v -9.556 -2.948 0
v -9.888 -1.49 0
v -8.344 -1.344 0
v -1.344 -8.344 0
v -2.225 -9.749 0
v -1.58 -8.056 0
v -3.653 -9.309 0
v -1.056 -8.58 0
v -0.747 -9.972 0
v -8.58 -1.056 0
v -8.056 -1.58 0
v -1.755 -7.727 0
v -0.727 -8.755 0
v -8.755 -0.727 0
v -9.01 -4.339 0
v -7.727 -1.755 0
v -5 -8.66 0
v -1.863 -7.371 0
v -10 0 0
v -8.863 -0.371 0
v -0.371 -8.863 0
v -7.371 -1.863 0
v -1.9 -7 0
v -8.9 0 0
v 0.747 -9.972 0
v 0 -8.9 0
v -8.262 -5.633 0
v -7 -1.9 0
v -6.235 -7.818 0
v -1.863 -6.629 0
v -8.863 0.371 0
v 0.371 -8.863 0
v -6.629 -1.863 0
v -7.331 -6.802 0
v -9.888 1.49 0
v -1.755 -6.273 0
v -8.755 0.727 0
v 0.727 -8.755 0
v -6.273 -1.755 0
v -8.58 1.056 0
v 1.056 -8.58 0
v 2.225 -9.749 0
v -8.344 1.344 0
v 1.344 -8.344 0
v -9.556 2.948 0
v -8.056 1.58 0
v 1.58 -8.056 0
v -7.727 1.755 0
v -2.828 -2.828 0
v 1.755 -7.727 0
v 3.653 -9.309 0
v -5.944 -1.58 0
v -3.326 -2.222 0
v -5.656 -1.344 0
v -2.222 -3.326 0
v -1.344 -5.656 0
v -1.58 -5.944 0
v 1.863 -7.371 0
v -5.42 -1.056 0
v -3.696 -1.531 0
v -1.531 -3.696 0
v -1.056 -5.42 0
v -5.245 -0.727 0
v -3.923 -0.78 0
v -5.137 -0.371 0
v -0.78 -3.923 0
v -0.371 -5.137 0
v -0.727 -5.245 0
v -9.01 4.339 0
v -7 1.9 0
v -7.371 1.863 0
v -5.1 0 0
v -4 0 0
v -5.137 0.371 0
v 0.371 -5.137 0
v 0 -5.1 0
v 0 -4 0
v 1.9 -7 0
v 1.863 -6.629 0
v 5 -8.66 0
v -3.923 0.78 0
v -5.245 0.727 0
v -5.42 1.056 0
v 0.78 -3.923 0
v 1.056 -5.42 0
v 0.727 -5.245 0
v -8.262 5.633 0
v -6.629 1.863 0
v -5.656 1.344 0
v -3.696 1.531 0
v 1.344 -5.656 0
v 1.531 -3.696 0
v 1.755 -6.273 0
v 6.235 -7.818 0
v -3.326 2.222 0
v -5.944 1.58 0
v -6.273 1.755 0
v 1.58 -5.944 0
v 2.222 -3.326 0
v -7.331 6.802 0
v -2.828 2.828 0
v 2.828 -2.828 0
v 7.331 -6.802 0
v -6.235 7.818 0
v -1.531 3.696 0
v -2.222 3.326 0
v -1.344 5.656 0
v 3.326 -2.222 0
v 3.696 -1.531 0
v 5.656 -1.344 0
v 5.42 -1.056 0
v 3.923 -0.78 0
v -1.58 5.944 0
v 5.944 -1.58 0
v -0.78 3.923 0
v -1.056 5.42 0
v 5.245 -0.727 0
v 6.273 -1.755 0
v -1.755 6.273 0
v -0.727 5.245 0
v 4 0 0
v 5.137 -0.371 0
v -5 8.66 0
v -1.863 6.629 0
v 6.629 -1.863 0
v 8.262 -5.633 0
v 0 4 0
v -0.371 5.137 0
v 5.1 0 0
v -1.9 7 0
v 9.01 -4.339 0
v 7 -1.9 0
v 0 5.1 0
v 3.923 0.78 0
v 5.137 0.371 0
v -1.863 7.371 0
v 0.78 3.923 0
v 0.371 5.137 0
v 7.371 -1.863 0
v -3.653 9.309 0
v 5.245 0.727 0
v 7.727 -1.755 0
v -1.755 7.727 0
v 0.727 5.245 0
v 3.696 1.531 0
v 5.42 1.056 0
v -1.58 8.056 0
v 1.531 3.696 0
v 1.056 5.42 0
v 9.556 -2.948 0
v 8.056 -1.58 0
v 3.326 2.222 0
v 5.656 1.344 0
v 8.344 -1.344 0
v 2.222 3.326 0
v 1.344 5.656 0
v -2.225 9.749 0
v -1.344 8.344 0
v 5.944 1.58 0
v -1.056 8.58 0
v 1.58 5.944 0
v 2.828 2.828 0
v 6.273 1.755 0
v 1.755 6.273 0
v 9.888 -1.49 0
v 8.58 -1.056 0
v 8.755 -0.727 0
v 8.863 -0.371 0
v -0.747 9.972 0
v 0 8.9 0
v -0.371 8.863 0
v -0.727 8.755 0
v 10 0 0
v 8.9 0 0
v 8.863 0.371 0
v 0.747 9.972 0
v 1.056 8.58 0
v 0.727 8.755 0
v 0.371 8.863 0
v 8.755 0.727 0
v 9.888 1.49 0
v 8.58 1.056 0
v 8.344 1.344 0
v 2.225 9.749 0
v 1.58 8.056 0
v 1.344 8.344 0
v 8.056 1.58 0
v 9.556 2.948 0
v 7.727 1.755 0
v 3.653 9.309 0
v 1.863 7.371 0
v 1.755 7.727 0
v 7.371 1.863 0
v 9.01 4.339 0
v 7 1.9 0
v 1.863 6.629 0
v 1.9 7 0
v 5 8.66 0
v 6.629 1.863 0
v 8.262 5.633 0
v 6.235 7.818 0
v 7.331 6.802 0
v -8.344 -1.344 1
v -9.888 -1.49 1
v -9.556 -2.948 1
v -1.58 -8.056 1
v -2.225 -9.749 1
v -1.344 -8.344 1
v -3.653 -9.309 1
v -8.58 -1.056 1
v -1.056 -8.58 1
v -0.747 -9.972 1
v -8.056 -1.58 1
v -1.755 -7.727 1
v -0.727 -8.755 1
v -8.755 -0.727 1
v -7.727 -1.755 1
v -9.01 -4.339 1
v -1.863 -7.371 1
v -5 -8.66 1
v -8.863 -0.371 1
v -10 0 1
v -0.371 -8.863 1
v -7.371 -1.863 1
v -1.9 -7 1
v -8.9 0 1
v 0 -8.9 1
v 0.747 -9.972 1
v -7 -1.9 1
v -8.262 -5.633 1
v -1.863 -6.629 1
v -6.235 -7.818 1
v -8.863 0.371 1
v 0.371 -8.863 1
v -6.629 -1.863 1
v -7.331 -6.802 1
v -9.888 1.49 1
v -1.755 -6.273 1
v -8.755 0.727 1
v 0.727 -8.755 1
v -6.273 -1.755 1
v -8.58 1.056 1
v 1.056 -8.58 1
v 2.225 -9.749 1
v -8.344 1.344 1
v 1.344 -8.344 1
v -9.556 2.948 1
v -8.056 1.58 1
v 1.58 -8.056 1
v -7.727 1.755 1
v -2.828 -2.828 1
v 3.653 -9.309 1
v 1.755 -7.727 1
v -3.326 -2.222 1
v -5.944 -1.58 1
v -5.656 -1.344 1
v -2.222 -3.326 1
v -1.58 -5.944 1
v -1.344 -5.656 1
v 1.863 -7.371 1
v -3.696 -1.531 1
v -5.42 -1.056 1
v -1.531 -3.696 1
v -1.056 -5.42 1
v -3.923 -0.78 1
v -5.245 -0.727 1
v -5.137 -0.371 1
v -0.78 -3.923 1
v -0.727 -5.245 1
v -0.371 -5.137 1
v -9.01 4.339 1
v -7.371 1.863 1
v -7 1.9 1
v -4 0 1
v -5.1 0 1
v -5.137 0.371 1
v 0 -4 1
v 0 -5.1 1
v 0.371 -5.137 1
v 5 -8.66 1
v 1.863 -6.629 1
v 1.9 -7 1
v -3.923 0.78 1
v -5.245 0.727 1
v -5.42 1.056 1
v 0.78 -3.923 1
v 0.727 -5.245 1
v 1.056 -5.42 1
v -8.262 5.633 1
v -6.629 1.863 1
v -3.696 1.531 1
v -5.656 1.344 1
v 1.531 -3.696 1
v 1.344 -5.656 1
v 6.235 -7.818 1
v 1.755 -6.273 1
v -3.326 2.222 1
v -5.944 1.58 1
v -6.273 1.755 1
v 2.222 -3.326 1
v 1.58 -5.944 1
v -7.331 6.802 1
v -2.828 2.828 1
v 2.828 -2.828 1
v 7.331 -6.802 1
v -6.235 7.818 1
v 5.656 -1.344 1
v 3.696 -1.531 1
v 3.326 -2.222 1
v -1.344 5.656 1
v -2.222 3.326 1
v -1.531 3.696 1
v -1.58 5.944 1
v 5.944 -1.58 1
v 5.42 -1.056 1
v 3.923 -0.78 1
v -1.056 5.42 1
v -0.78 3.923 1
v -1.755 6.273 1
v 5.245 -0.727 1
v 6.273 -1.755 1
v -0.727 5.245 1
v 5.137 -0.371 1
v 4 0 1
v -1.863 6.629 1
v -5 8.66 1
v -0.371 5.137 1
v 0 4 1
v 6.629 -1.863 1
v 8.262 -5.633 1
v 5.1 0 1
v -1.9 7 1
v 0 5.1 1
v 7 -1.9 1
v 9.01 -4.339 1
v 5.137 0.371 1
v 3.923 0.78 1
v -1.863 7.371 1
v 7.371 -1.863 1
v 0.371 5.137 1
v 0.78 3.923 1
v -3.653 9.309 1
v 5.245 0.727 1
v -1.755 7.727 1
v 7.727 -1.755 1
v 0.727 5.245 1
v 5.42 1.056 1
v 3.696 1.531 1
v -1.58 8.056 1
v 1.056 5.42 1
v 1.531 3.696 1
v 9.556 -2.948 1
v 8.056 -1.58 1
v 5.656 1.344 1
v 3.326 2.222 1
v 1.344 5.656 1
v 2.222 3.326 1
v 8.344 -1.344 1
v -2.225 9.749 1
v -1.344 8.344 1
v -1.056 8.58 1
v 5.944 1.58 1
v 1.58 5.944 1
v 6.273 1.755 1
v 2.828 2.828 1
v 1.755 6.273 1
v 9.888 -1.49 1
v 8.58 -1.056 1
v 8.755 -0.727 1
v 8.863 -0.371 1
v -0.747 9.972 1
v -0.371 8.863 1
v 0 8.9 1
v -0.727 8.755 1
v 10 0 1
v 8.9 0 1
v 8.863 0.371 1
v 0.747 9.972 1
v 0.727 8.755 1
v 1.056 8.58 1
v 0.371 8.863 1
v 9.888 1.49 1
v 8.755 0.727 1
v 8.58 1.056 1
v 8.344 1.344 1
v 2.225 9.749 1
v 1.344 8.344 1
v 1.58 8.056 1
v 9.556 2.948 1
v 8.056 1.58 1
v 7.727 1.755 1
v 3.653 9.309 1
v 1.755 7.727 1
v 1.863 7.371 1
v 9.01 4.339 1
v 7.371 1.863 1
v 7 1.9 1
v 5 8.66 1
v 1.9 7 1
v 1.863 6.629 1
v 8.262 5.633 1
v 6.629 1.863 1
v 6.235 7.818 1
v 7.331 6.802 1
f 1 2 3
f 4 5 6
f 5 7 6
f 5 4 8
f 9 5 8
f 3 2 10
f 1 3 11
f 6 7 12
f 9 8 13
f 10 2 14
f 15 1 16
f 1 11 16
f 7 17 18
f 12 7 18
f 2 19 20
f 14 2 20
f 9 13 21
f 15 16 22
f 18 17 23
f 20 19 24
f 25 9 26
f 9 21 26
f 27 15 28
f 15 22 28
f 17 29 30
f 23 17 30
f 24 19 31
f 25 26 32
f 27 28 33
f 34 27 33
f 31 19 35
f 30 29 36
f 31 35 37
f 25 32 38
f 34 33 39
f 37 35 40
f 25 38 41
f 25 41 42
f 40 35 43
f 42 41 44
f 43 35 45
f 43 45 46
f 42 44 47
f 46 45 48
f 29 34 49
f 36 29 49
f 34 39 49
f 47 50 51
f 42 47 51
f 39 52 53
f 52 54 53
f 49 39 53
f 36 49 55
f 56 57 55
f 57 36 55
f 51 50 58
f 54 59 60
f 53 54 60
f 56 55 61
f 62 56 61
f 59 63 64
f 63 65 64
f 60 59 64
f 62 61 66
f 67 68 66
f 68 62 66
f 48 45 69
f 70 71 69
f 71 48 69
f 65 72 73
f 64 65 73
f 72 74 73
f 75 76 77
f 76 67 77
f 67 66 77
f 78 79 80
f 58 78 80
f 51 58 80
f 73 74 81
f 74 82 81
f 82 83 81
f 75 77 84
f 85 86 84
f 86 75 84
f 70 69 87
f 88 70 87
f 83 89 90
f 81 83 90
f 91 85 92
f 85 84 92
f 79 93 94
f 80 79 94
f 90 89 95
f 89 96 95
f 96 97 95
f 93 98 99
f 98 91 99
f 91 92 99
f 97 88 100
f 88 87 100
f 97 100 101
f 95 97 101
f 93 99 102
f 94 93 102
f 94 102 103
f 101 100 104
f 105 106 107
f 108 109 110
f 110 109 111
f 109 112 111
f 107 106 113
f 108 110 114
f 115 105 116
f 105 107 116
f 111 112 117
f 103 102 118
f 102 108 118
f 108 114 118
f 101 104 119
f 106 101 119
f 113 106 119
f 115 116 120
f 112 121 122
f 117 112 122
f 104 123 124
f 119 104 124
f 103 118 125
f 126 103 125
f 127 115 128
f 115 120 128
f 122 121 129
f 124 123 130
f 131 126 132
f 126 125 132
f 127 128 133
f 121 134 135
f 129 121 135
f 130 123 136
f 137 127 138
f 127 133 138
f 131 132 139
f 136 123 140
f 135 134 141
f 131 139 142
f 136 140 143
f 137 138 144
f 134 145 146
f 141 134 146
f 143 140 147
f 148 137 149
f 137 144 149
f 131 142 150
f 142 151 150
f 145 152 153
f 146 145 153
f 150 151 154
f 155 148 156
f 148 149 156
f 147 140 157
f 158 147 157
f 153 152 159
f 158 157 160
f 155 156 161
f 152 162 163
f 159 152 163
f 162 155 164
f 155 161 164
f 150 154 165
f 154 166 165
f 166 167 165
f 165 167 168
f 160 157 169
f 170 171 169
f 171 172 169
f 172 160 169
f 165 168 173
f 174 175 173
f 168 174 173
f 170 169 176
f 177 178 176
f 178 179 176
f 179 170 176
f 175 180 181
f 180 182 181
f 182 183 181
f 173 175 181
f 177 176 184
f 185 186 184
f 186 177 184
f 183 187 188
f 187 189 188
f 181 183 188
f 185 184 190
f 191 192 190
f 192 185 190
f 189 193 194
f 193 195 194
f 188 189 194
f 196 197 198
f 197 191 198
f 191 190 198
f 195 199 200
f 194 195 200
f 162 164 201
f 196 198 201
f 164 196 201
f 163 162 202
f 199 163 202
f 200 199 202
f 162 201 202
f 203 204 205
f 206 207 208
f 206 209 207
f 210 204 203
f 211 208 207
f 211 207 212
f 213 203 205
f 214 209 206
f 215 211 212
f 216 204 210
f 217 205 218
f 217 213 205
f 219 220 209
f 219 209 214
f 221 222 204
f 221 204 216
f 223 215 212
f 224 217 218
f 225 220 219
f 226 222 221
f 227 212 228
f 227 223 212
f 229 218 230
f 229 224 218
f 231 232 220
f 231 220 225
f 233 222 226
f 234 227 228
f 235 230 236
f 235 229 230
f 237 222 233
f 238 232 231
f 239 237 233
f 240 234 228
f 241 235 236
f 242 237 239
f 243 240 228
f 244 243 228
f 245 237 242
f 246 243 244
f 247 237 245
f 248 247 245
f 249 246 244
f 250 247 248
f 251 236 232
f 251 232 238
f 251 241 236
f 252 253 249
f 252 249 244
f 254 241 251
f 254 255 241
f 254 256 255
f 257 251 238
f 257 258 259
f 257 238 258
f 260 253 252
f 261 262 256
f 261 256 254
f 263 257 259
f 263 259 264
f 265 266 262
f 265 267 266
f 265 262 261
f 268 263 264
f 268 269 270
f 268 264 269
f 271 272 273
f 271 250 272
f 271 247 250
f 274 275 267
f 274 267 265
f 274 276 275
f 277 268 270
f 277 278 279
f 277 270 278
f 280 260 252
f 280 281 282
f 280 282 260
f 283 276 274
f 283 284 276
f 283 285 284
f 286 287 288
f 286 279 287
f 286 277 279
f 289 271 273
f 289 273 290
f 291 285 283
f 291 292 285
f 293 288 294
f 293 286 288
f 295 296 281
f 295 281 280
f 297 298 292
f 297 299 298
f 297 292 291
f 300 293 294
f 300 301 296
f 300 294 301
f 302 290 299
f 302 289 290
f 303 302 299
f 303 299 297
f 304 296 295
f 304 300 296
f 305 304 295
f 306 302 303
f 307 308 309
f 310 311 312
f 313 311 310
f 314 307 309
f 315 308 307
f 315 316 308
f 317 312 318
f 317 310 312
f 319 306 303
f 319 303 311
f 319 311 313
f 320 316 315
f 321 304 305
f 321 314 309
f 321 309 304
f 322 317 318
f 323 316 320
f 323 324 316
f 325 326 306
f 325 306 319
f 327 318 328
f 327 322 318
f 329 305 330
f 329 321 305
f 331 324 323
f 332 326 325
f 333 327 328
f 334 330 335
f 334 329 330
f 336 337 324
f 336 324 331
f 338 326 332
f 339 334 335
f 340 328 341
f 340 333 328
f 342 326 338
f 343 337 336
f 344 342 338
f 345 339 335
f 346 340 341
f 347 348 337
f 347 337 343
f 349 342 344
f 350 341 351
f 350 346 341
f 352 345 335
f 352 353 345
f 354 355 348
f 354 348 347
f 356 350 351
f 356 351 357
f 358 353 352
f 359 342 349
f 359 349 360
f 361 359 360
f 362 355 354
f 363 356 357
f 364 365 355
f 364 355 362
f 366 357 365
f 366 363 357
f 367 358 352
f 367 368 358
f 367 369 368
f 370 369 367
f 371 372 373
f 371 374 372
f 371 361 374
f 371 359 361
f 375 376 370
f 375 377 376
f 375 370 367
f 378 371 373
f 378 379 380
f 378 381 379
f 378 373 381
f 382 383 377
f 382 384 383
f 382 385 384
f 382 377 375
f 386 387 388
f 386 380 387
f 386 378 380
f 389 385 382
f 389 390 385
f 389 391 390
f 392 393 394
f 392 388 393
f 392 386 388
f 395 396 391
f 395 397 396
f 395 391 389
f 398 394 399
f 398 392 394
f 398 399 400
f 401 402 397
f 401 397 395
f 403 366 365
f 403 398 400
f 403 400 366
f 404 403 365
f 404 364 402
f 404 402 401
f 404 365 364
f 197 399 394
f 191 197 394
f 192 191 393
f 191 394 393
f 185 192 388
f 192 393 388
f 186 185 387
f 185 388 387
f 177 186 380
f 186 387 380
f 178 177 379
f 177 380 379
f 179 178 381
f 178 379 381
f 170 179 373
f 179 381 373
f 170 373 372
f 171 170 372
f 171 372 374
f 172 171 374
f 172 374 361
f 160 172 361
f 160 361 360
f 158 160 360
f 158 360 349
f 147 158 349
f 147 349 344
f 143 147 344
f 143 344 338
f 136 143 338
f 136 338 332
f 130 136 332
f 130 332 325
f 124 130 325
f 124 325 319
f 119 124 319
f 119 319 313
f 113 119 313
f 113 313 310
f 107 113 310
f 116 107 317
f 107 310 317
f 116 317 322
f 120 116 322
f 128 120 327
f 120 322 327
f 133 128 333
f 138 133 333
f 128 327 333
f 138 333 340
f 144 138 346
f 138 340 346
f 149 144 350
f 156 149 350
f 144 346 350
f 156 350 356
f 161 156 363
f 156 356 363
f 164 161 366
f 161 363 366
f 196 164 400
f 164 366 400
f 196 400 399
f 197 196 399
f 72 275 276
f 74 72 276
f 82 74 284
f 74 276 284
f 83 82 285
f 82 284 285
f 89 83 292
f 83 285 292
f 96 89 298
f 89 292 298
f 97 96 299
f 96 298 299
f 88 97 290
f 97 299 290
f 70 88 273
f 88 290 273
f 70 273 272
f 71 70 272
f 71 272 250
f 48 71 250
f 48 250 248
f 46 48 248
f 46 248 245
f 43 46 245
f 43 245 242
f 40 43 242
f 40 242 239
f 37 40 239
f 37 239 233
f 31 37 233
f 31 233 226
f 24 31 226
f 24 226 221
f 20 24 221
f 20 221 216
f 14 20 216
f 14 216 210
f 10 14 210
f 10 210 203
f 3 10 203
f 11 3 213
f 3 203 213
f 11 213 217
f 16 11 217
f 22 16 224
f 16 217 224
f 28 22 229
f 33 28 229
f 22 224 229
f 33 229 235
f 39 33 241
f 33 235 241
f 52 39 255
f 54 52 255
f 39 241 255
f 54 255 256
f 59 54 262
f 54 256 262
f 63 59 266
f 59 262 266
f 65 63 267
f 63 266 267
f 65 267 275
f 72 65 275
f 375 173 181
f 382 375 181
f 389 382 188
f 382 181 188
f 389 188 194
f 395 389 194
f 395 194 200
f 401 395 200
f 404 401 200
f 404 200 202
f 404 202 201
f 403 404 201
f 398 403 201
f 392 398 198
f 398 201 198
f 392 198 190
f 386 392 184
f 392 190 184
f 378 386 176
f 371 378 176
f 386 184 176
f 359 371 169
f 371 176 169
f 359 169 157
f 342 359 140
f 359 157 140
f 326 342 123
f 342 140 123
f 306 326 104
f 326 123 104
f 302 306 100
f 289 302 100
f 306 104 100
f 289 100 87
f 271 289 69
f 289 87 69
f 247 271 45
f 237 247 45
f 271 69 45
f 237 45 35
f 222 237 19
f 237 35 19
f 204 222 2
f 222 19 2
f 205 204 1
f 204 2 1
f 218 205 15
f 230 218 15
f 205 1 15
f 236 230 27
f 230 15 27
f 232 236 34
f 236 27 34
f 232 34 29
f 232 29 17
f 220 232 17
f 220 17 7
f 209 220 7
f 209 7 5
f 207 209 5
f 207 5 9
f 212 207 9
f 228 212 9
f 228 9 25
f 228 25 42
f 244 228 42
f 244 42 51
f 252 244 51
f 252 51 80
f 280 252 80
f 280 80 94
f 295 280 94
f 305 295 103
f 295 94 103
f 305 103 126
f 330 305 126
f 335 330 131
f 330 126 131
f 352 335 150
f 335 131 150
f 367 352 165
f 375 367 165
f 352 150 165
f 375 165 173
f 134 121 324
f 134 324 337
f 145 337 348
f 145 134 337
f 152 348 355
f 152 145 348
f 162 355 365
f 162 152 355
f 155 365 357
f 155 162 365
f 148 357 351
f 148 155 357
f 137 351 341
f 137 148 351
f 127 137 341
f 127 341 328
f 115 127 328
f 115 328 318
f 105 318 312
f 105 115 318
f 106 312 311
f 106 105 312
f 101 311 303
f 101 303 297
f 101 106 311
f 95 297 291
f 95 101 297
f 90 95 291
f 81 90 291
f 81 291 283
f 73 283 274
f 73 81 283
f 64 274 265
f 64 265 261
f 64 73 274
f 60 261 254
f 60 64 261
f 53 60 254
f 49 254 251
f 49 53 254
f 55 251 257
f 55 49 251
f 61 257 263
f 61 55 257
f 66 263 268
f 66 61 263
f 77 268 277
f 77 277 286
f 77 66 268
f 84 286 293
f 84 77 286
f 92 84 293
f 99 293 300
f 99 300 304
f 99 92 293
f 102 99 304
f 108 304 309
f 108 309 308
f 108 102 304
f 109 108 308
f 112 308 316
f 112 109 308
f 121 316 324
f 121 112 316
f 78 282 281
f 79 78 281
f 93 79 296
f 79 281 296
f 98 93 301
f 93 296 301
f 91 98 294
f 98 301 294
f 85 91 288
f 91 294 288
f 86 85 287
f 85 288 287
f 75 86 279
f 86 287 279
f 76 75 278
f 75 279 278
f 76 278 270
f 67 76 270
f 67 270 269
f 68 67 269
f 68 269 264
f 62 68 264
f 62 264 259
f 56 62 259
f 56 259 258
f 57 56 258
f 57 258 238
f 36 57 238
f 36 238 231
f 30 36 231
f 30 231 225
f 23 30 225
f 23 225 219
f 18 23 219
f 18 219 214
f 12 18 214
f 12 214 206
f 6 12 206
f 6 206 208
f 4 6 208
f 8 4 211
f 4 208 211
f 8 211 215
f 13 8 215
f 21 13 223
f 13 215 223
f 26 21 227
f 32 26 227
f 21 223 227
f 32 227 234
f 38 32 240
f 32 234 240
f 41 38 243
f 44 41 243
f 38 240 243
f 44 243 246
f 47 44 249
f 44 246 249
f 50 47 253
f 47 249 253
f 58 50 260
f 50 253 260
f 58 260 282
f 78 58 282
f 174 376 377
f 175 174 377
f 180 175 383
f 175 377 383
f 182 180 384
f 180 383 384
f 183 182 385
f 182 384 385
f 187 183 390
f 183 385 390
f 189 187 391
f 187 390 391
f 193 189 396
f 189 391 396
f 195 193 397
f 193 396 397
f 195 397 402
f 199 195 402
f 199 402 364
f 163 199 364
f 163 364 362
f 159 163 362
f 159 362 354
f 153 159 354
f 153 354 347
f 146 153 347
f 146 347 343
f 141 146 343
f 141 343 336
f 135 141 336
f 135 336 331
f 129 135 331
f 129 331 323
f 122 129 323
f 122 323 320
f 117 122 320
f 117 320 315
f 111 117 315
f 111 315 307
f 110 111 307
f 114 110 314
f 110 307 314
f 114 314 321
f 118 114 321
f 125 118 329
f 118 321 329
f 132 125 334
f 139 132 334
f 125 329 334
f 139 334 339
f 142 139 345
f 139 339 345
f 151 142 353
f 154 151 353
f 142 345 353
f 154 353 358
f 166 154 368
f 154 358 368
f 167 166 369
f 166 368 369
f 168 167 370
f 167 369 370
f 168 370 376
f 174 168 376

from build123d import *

# Parameters (mm, degrees)
ESQUISSE1_R                  = 10
ESQUISSE1_R_2                = 4
BOSS_EXTRU_1_DEPTH           = 1
ESQUISSE2_R                  = 1.9
ENL_V_MAT_EXTRU_1_DEPTH      = 1
ENL_V_MAT_EXTRU_1_DEPTH_BACK = 2


with BuildPart() as part:
    # Esquisse1 → Boss.-Extru.1 (new body)
    with BuildSketch(Plane.XY):
        Circle(ESQUISSE1_R)
        Circle(ESQUISSE1_R_2, mode=Mode.SUBTRACT)
    extrude(amount=BOSS_EXTRU_1_DEPTH)

    # Esquisse2 → Enlèv. mat.-Extru.1 (cut, two sides)
    with BuildSketch(Plane.XY.offset(1)) as enl_v_mat_extru_1_sk:
        with Locations((7, 0)):
            Circle(ESQUISSE2_R)
        with Locations((0, -7)):
            Circle(ESQUISSE2_R)
        with Locations((-7, 0)):
            Circle(ESQUISSE2_R)
        with Locations((0, 7)):
            Circle(ESQUISSE2_R)
    extrude(amount=ENL_V_MAT_EXTRU_1_DEPTH, mode=Mode.SUBTRACT)
    extrude(enl_v_mat_extru_1_sk.sketch, amount=-ENL_V_MAT_EXTRU_1_DEPTH_BACK, mode=Mode.SUBTRACT)


solid = part.part
